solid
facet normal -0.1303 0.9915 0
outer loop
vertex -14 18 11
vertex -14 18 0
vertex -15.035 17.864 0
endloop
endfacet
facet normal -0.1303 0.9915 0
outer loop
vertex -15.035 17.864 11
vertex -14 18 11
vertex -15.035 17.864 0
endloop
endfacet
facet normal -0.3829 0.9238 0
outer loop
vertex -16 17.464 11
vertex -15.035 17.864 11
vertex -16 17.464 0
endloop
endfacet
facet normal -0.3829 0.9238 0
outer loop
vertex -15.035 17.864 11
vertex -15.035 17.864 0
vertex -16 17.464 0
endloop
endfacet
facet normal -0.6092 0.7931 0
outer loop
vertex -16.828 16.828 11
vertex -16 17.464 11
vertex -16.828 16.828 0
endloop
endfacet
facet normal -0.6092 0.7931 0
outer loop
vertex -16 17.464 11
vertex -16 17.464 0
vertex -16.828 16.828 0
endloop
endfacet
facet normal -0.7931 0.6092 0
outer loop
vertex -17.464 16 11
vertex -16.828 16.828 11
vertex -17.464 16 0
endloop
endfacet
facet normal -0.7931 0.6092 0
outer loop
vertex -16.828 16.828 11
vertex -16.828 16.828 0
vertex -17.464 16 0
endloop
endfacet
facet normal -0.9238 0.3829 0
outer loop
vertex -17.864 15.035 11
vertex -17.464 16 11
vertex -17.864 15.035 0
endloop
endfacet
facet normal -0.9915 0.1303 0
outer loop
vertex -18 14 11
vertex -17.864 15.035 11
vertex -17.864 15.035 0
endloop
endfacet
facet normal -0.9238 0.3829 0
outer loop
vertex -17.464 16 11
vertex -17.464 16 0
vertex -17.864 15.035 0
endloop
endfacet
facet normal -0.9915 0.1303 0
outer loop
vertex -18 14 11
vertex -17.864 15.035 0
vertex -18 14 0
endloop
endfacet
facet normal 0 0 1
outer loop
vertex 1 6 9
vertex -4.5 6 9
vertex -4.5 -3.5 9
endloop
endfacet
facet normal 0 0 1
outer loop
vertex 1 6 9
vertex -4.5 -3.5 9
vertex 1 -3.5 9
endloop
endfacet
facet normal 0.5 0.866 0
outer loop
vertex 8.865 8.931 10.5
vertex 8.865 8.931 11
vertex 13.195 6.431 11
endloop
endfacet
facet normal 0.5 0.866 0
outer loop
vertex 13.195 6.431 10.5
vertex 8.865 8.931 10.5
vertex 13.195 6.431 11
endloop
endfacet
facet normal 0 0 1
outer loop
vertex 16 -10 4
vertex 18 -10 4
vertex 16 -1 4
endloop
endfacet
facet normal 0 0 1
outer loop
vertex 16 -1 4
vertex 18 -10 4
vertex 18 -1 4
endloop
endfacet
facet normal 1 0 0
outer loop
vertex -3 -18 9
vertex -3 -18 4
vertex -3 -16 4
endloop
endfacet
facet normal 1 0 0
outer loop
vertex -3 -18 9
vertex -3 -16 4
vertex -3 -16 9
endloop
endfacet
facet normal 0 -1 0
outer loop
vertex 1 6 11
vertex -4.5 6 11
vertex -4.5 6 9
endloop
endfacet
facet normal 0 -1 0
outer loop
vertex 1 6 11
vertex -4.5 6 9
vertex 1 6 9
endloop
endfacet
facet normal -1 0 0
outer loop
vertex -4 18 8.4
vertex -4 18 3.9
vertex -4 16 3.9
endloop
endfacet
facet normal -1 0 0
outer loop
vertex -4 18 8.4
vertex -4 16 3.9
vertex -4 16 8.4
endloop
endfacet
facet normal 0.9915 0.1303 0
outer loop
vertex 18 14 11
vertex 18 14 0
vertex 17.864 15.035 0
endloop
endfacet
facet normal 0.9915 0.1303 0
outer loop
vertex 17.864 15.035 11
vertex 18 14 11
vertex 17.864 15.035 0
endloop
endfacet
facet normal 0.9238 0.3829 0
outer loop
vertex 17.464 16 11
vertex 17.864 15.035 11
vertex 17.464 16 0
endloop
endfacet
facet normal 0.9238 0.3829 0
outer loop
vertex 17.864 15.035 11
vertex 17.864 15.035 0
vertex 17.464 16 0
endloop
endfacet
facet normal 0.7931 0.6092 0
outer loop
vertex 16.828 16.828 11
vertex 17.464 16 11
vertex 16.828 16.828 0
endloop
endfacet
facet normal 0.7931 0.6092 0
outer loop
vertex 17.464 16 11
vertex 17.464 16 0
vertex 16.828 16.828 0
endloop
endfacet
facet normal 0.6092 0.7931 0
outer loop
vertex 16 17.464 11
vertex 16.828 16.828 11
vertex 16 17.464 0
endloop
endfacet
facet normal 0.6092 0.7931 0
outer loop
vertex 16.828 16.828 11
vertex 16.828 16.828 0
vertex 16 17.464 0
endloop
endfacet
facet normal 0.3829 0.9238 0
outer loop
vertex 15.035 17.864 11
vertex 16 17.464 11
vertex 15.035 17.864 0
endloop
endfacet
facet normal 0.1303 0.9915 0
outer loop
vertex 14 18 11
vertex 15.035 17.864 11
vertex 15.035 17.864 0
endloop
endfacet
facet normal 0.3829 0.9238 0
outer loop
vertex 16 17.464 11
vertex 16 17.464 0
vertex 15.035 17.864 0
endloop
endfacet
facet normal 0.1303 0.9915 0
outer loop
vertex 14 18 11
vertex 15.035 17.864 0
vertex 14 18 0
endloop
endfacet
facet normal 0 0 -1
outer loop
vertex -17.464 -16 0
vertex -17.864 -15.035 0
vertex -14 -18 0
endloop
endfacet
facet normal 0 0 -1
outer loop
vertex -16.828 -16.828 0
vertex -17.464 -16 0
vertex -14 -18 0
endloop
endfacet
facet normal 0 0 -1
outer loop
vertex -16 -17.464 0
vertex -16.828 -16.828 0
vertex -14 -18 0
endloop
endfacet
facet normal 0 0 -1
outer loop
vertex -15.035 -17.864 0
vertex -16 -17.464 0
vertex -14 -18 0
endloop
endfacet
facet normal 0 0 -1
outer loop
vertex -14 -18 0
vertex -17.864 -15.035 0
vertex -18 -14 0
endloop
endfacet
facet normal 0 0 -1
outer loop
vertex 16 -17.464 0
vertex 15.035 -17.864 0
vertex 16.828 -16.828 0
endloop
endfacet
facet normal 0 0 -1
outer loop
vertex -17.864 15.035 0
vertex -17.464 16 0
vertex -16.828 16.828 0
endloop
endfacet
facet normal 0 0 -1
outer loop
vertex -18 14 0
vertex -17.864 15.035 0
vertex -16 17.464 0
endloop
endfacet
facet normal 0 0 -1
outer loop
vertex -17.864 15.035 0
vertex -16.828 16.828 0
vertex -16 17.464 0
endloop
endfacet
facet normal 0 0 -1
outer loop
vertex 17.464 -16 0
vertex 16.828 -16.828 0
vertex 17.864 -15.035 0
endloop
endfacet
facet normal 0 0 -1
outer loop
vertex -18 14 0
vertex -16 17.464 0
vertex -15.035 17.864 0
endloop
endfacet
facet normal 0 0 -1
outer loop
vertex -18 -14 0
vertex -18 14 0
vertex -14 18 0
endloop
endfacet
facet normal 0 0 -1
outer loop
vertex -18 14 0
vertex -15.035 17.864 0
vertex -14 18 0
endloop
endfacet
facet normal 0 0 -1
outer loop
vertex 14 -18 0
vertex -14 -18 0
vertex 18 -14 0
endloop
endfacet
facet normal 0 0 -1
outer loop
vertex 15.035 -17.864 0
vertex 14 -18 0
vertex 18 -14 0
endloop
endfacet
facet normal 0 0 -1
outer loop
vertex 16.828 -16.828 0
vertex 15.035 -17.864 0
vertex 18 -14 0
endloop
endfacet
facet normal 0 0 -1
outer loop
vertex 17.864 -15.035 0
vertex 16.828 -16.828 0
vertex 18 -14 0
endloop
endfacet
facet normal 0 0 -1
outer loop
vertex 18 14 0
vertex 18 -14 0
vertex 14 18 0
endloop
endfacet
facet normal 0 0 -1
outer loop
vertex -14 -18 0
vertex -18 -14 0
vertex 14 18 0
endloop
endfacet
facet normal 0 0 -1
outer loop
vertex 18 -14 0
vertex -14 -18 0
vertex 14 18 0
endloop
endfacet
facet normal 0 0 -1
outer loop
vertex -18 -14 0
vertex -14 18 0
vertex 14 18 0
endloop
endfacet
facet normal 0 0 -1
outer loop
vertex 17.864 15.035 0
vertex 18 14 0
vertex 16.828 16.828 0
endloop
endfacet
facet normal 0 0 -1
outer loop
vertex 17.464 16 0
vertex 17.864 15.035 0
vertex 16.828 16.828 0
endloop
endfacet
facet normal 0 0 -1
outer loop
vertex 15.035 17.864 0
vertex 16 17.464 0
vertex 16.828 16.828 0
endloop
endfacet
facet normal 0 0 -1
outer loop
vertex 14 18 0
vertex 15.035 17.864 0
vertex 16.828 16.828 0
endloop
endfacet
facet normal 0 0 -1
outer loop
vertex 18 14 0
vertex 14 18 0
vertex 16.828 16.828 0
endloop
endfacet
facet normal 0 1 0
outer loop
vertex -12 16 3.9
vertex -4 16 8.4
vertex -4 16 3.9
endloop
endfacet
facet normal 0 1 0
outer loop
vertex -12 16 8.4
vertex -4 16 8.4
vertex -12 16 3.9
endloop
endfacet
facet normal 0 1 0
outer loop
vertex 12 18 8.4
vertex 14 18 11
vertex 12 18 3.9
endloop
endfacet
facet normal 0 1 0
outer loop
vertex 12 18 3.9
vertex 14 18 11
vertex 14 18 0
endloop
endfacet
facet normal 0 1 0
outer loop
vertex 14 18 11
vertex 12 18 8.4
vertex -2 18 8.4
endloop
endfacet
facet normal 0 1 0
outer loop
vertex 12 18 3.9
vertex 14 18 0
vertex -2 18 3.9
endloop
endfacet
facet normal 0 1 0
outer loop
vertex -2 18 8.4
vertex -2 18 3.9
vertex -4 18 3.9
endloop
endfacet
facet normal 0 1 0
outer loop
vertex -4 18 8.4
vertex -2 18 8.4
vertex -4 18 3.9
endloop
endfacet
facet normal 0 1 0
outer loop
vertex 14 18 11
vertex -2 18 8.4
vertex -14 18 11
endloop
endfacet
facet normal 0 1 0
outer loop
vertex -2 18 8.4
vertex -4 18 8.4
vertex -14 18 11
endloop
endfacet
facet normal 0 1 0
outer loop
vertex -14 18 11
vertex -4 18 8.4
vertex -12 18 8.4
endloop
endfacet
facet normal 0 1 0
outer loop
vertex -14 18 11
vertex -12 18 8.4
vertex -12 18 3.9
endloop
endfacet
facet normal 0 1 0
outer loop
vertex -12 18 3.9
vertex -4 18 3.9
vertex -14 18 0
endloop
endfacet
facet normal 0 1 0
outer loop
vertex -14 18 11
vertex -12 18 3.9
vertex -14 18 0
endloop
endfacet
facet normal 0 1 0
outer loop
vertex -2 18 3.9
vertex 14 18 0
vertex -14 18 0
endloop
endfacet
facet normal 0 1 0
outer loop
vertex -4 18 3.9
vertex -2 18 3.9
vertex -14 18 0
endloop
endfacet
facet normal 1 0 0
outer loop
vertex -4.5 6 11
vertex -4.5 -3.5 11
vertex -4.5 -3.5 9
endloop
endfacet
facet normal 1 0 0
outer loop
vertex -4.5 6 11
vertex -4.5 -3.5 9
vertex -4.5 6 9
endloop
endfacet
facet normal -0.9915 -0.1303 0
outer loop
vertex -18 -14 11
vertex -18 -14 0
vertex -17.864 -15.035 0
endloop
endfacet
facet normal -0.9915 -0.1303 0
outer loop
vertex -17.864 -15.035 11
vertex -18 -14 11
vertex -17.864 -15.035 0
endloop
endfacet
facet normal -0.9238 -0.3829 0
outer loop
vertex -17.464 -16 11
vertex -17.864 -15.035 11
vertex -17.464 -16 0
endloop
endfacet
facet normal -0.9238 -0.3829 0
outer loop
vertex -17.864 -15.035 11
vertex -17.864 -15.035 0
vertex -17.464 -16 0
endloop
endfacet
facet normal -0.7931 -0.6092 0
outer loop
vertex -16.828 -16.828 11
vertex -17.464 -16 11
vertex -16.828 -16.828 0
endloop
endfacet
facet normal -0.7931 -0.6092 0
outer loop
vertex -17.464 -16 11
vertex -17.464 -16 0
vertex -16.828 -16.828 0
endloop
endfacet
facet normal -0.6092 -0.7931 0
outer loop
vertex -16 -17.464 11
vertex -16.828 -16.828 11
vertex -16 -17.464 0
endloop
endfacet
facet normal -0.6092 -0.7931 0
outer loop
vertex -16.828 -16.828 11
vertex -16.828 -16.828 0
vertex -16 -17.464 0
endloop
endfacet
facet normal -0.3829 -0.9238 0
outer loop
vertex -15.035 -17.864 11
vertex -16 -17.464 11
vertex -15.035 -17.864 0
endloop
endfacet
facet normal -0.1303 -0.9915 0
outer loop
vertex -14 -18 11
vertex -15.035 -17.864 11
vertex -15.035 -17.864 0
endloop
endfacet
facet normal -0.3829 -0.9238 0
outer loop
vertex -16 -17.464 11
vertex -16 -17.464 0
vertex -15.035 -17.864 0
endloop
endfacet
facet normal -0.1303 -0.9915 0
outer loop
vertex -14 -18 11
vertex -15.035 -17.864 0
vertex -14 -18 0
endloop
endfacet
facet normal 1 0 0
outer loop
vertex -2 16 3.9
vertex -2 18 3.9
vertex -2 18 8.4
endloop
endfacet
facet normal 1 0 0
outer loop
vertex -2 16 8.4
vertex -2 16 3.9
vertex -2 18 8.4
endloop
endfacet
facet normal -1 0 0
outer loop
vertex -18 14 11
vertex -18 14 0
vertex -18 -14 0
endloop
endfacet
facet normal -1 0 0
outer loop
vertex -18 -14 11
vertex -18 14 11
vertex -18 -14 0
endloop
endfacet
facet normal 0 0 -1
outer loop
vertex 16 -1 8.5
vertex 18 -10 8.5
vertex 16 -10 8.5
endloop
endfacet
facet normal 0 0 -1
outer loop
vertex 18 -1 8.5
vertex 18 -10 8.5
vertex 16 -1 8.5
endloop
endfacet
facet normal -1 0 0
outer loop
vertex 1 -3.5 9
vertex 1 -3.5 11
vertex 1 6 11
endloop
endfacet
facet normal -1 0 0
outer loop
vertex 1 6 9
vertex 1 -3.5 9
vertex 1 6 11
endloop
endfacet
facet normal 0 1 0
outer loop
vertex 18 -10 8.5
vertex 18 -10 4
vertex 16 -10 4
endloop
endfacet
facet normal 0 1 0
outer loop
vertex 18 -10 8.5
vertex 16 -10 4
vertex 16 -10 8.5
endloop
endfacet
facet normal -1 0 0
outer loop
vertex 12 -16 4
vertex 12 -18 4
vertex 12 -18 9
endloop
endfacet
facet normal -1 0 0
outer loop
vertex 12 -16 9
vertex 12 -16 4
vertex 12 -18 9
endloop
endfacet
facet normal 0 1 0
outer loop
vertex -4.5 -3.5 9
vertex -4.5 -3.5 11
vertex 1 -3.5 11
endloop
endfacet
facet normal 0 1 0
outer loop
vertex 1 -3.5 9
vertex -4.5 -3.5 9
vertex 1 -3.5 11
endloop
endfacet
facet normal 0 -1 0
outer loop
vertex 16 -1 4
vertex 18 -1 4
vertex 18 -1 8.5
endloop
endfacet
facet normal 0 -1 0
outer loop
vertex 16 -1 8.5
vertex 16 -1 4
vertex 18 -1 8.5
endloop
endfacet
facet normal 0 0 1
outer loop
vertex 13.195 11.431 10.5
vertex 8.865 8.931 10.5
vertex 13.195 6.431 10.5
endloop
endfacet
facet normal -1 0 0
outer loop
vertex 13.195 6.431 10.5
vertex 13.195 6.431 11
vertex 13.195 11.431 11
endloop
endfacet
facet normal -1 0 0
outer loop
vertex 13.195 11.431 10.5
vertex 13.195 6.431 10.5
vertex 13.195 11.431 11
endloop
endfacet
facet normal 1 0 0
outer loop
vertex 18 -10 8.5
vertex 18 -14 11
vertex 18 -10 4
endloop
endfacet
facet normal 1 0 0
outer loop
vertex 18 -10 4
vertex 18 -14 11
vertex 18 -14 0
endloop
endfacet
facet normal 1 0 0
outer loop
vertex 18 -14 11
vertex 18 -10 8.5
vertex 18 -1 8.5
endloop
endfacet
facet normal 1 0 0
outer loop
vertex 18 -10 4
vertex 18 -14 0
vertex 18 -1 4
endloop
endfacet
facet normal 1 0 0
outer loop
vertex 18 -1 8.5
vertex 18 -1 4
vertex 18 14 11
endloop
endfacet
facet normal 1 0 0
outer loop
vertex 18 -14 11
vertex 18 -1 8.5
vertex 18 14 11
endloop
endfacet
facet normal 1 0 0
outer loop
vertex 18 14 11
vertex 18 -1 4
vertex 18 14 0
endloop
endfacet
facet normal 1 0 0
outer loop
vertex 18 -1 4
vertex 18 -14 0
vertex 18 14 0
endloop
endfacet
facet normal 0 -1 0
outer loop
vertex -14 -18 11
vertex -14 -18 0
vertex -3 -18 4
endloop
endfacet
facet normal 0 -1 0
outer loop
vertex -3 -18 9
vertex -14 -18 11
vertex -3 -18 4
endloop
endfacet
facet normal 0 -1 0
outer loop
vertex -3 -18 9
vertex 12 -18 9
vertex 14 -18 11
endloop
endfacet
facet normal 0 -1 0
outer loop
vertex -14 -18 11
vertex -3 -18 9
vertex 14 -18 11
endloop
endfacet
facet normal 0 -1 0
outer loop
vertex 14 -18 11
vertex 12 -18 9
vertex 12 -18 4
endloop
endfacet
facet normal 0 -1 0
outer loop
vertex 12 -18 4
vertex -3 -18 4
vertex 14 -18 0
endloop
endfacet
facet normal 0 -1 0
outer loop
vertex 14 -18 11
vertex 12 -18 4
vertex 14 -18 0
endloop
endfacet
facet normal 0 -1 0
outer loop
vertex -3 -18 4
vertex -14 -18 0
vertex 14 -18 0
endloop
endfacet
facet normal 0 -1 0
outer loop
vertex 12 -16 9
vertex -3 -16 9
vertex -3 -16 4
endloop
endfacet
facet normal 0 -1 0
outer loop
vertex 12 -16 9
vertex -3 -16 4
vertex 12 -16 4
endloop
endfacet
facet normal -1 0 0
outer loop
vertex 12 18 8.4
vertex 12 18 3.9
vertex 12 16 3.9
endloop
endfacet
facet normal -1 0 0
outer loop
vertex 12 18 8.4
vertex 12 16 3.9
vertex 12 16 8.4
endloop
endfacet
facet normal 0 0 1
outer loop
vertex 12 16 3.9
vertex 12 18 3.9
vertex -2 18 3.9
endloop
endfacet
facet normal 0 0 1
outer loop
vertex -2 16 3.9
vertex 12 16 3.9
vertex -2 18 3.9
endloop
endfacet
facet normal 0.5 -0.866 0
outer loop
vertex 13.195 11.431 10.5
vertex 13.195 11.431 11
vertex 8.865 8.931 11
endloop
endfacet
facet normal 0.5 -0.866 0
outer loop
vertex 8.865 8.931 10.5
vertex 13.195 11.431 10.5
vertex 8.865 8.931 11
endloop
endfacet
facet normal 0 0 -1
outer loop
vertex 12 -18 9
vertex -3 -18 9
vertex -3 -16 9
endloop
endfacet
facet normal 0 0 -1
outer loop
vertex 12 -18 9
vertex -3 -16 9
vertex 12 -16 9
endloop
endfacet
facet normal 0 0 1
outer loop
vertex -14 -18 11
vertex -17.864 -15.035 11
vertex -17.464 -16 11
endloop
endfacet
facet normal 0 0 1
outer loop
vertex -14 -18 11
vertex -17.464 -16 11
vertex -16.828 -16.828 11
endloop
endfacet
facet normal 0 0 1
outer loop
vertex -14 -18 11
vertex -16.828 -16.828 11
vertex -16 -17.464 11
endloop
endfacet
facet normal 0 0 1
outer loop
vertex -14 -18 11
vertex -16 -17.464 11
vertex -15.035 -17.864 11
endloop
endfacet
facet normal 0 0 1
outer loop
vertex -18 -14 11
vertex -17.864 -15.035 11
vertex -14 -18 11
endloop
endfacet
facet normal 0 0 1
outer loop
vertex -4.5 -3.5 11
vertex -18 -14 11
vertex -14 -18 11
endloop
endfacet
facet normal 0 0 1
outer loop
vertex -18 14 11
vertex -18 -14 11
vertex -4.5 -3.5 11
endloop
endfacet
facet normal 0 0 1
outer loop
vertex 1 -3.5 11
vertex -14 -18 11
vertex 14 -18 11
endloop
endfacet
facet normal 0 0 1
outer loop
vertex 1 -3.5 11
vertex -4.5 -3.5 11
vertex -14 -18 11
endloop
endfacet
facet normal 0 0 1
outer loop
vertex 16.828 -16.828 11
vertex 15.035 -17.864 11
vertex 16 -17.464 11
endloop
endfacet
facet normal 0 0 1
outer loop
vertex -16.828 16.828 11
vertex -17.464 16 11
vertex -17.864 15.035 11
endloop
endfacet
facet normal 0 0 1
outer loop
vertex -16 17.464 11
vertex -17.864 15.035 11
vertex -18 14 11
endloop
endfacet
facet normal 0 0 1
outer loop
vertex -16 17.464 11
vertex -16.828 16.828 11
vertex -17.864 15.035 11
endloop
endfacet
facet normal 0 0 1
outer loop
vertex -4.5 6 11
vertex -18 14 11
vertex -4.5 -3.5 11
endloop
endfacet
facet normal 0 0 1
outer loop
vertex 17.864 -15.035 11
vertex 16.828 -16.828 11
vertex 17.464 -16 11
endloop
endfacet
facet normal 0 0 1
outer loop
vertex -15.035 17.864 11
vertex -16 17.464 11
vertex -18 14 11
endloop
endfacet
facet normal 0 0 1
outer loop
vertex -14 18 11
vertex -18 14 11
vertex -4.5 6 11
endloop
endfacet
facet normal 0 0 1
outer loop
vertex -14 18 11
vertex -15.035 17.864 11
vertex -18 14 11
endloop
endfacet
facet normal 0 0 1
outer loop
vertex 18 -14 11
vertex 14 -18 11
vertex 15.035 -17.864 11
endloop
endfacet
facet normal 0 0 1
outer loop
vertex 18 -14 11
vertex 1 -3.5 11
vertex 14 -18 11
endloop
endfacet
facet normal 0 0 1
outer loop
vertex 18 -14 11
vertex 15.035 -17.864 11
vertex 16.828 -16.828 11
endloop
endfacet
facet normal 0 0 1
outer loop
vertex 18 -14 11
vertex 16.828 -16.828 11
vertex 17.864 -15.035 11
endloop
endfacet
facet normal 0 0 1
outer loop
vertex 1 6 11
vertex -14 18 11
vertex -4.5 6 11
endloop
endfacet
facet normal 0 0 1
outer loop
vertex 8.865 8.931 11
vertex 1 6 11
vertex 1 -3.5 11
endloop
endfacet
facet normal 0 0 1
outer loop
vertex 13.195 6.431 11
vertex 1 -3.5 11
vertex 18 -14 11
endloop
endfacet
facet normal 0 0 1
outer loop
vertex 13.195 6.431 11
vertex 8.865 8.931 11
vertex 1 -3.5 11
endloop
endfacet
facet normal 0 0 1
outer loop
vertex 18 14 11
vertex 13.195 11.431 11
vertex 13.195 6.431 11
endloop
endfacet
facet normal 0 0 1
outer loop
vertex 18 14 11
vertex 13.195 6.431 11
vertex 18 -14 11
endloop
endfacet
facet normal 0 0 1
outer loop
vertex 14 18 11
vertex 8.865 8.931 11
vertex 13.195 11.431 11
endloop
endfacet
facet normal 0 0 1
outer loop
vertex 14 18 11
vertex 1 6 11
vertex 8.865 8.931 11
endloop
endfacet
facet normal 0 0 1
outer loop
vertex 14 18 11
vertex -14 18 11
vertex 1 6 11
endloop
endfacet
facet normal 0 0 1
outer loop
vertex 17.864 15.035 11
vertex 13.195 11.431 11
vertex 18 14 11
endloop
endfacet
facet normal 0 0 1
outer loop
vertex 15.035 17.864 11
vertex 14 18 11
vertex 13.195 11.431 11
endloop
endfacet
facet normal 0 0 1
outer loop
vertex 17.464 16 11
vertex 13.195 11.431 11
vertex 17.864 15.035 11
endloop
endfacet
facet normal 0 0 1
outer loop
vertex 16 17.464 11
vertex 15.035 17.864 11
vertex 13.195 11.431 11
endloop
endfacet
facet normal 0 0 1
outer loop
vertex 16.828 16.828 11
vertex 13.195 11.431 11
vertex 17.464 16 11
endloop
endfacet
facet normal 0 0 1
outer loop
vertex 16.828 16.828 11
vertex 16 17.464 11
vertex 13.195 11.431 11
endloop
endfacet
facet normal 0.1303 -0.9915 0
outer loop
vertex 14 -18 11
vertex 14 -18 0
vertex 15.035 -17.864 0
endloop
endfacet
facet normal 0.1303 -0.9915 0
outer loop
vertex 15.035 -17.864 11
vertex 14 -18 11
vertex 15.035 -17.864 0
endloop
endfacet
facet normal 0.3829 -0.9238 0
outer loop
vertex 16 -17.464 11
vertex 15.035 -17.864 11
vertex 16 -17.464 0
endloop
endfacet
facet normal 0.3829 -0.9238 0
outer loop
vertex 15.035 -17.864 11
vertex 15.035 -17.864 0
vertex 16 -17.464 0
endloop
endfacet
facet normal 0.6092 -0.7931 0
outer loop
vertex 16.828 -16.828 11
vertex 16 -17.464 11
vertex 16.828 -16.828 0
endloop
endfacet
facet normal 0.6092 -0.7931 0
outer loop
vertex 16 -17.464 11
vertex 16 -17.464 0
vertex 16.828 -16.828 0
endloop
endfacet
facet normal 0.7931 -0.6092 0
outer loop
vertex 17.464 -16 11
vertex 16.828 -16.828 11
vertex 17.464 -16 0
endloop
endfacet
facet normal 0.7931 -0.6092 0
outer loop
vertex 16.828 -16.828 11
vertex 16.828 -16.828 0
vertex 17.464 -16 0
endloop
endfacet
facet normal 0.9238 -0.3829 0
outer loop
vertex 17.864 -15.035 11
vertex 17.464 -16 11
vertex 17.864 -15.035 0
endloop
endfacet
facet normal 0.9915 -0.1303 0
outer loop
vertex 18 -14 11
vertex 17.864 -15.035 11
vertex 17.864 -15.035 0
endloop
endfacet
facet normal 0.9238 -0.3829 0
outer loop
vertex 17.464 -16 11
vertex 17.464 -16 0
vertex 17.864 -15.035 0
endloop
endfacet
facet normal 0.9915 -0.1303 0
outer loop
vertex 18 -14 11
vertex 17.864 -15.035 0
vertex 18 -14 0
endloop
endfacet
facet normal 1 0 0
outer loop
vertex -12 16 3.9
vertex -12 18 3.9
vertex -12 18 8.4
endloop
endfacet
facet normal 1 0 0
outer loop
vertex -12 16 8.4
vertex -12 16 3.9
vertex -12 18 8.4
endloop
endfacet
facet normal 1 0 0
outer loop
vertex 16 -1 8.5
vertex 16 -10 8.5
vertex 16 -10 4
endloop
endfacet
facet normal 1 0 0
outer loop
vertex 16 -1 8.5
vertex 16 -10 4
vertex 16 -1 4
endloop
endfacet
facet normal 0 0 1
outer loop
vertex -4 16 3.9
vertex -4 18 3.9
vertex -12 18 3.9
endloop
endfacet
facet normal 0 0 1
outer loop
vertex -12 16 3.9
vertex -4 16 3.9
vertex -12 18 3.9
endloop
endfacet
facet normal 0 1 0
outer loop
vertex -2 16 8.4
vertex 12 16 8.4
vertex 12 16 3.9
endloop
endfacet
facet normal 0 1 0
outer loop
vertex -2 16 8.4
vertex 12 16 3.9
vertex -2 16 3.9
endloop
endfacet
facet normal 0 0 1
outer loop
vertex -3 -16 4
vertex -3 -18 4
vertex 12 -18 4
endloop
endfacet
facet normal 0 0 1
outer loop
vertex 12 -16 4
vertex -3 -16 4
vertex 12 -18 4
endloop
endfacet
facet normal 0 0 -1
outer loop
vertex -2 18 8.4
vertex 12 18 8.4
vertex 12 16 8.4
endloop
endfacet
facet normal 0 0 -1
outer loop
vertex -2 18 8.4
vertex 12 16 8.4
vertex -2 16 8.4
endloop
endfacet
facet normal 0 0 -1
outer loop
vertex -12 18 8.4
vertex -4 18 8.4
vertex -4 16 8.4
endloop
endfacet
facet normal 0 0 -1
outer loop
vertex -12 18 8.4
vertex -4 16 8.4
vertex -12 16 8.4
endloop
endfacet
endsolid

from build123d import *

# Parameters (mm, degrees)
F1_DEPTH  = 11
F2_W      = 15
F2_H      = 5
F3_DEPTH  = 2
F4_W      = 9
F4_H      = 4.5
F5_DEPTH  = 2
F6_W      = 14
F6_H      = 4.5
F6_W_2    = 8
F7_DEPTH  = 2
F8_W      = 5.5
F8_H      = 9.5
F9_DEPTH  = 2
F10_DEPTH = 0.5


with BuildPart() as f1:
    # F0 (on Top) → F1 (new body)
    with BuildSketch(Plane.XY):
        with BuildLine():
            Line((14, 18), (-14, 18))
            ThreePointArc((-14, 18), (-16.828427, 16.828427), (-18, 14))
            Line((-18, 14), (-18, -14))
            ThreePointArc((-18, -14), (-16.828427, -16.828427), (-14, -18))
            Line((-14, -18), (14, -18))
            ThreePointArc((14, -18), (16.828427, -16.828427), (18, -14))
            Line((18, -14), (18, 14))
            ThreePointArc((18, 14), (16.828427, 16.828427), (14, 18))
        make_face()
    extrude(amount=F1_DEPTH)

    # F2 (on face) → F3 (cut)
    with BuildSketch(Plane.XZ.offset(18)):
        with Locations((4.5, 6.5)):
            Rectangle(F2_W, F2_H)
    extrude(amount=-F3_DEPTH, mode=Mode.SUBTRACT)

    # F4 (on face) → F5 (cut)
    with BuildSketch(Plane.YZ.offset(18)):
        with Locations((-5.5, 6.25)):
            Rectangle(F4_W, F4_H)
    extrude(amount=-F5_DEPTH, mode=Mode.SUBTRACT)

    # F6 (on face) → F7 (cut)
    with BuildSketch(Plane(origin=(0, 18, 0), x_dir=(-1, 0, 0), z_dir=(0, 1, 0))):
        with Locations((-5, 6.15)):
            Rectangle(F6_W, F6_H)
        with Locations((8, 6.15)):
            Rectangle(F6_W_2, F6_H)
    extrude(amount=-F7_DEPTH, mode=Mode.SUBTRACT)

    # F8 (on face) → F9 (cut)
    with BuildSketch(Plane.XY.offset(11)):
        with Locations((-1.75, 1.25)):
            Rectangle(F8_W, F8_H)
    extrude(amount=-F9_DEPTH, mode=Mode.SUBTRACT)

    # F8 (on face) → F10 (cut)
    with BuildSketch(Plane.XY.offset(11)):
        Polygon((13.195144, 11.430887), (8.865017, 8.930887), (13.195144, 6.430887), align=None)
    extrude(amount=-F10_DEPTH, mode=Mode.SUBTRACT)


solid = f1.part
